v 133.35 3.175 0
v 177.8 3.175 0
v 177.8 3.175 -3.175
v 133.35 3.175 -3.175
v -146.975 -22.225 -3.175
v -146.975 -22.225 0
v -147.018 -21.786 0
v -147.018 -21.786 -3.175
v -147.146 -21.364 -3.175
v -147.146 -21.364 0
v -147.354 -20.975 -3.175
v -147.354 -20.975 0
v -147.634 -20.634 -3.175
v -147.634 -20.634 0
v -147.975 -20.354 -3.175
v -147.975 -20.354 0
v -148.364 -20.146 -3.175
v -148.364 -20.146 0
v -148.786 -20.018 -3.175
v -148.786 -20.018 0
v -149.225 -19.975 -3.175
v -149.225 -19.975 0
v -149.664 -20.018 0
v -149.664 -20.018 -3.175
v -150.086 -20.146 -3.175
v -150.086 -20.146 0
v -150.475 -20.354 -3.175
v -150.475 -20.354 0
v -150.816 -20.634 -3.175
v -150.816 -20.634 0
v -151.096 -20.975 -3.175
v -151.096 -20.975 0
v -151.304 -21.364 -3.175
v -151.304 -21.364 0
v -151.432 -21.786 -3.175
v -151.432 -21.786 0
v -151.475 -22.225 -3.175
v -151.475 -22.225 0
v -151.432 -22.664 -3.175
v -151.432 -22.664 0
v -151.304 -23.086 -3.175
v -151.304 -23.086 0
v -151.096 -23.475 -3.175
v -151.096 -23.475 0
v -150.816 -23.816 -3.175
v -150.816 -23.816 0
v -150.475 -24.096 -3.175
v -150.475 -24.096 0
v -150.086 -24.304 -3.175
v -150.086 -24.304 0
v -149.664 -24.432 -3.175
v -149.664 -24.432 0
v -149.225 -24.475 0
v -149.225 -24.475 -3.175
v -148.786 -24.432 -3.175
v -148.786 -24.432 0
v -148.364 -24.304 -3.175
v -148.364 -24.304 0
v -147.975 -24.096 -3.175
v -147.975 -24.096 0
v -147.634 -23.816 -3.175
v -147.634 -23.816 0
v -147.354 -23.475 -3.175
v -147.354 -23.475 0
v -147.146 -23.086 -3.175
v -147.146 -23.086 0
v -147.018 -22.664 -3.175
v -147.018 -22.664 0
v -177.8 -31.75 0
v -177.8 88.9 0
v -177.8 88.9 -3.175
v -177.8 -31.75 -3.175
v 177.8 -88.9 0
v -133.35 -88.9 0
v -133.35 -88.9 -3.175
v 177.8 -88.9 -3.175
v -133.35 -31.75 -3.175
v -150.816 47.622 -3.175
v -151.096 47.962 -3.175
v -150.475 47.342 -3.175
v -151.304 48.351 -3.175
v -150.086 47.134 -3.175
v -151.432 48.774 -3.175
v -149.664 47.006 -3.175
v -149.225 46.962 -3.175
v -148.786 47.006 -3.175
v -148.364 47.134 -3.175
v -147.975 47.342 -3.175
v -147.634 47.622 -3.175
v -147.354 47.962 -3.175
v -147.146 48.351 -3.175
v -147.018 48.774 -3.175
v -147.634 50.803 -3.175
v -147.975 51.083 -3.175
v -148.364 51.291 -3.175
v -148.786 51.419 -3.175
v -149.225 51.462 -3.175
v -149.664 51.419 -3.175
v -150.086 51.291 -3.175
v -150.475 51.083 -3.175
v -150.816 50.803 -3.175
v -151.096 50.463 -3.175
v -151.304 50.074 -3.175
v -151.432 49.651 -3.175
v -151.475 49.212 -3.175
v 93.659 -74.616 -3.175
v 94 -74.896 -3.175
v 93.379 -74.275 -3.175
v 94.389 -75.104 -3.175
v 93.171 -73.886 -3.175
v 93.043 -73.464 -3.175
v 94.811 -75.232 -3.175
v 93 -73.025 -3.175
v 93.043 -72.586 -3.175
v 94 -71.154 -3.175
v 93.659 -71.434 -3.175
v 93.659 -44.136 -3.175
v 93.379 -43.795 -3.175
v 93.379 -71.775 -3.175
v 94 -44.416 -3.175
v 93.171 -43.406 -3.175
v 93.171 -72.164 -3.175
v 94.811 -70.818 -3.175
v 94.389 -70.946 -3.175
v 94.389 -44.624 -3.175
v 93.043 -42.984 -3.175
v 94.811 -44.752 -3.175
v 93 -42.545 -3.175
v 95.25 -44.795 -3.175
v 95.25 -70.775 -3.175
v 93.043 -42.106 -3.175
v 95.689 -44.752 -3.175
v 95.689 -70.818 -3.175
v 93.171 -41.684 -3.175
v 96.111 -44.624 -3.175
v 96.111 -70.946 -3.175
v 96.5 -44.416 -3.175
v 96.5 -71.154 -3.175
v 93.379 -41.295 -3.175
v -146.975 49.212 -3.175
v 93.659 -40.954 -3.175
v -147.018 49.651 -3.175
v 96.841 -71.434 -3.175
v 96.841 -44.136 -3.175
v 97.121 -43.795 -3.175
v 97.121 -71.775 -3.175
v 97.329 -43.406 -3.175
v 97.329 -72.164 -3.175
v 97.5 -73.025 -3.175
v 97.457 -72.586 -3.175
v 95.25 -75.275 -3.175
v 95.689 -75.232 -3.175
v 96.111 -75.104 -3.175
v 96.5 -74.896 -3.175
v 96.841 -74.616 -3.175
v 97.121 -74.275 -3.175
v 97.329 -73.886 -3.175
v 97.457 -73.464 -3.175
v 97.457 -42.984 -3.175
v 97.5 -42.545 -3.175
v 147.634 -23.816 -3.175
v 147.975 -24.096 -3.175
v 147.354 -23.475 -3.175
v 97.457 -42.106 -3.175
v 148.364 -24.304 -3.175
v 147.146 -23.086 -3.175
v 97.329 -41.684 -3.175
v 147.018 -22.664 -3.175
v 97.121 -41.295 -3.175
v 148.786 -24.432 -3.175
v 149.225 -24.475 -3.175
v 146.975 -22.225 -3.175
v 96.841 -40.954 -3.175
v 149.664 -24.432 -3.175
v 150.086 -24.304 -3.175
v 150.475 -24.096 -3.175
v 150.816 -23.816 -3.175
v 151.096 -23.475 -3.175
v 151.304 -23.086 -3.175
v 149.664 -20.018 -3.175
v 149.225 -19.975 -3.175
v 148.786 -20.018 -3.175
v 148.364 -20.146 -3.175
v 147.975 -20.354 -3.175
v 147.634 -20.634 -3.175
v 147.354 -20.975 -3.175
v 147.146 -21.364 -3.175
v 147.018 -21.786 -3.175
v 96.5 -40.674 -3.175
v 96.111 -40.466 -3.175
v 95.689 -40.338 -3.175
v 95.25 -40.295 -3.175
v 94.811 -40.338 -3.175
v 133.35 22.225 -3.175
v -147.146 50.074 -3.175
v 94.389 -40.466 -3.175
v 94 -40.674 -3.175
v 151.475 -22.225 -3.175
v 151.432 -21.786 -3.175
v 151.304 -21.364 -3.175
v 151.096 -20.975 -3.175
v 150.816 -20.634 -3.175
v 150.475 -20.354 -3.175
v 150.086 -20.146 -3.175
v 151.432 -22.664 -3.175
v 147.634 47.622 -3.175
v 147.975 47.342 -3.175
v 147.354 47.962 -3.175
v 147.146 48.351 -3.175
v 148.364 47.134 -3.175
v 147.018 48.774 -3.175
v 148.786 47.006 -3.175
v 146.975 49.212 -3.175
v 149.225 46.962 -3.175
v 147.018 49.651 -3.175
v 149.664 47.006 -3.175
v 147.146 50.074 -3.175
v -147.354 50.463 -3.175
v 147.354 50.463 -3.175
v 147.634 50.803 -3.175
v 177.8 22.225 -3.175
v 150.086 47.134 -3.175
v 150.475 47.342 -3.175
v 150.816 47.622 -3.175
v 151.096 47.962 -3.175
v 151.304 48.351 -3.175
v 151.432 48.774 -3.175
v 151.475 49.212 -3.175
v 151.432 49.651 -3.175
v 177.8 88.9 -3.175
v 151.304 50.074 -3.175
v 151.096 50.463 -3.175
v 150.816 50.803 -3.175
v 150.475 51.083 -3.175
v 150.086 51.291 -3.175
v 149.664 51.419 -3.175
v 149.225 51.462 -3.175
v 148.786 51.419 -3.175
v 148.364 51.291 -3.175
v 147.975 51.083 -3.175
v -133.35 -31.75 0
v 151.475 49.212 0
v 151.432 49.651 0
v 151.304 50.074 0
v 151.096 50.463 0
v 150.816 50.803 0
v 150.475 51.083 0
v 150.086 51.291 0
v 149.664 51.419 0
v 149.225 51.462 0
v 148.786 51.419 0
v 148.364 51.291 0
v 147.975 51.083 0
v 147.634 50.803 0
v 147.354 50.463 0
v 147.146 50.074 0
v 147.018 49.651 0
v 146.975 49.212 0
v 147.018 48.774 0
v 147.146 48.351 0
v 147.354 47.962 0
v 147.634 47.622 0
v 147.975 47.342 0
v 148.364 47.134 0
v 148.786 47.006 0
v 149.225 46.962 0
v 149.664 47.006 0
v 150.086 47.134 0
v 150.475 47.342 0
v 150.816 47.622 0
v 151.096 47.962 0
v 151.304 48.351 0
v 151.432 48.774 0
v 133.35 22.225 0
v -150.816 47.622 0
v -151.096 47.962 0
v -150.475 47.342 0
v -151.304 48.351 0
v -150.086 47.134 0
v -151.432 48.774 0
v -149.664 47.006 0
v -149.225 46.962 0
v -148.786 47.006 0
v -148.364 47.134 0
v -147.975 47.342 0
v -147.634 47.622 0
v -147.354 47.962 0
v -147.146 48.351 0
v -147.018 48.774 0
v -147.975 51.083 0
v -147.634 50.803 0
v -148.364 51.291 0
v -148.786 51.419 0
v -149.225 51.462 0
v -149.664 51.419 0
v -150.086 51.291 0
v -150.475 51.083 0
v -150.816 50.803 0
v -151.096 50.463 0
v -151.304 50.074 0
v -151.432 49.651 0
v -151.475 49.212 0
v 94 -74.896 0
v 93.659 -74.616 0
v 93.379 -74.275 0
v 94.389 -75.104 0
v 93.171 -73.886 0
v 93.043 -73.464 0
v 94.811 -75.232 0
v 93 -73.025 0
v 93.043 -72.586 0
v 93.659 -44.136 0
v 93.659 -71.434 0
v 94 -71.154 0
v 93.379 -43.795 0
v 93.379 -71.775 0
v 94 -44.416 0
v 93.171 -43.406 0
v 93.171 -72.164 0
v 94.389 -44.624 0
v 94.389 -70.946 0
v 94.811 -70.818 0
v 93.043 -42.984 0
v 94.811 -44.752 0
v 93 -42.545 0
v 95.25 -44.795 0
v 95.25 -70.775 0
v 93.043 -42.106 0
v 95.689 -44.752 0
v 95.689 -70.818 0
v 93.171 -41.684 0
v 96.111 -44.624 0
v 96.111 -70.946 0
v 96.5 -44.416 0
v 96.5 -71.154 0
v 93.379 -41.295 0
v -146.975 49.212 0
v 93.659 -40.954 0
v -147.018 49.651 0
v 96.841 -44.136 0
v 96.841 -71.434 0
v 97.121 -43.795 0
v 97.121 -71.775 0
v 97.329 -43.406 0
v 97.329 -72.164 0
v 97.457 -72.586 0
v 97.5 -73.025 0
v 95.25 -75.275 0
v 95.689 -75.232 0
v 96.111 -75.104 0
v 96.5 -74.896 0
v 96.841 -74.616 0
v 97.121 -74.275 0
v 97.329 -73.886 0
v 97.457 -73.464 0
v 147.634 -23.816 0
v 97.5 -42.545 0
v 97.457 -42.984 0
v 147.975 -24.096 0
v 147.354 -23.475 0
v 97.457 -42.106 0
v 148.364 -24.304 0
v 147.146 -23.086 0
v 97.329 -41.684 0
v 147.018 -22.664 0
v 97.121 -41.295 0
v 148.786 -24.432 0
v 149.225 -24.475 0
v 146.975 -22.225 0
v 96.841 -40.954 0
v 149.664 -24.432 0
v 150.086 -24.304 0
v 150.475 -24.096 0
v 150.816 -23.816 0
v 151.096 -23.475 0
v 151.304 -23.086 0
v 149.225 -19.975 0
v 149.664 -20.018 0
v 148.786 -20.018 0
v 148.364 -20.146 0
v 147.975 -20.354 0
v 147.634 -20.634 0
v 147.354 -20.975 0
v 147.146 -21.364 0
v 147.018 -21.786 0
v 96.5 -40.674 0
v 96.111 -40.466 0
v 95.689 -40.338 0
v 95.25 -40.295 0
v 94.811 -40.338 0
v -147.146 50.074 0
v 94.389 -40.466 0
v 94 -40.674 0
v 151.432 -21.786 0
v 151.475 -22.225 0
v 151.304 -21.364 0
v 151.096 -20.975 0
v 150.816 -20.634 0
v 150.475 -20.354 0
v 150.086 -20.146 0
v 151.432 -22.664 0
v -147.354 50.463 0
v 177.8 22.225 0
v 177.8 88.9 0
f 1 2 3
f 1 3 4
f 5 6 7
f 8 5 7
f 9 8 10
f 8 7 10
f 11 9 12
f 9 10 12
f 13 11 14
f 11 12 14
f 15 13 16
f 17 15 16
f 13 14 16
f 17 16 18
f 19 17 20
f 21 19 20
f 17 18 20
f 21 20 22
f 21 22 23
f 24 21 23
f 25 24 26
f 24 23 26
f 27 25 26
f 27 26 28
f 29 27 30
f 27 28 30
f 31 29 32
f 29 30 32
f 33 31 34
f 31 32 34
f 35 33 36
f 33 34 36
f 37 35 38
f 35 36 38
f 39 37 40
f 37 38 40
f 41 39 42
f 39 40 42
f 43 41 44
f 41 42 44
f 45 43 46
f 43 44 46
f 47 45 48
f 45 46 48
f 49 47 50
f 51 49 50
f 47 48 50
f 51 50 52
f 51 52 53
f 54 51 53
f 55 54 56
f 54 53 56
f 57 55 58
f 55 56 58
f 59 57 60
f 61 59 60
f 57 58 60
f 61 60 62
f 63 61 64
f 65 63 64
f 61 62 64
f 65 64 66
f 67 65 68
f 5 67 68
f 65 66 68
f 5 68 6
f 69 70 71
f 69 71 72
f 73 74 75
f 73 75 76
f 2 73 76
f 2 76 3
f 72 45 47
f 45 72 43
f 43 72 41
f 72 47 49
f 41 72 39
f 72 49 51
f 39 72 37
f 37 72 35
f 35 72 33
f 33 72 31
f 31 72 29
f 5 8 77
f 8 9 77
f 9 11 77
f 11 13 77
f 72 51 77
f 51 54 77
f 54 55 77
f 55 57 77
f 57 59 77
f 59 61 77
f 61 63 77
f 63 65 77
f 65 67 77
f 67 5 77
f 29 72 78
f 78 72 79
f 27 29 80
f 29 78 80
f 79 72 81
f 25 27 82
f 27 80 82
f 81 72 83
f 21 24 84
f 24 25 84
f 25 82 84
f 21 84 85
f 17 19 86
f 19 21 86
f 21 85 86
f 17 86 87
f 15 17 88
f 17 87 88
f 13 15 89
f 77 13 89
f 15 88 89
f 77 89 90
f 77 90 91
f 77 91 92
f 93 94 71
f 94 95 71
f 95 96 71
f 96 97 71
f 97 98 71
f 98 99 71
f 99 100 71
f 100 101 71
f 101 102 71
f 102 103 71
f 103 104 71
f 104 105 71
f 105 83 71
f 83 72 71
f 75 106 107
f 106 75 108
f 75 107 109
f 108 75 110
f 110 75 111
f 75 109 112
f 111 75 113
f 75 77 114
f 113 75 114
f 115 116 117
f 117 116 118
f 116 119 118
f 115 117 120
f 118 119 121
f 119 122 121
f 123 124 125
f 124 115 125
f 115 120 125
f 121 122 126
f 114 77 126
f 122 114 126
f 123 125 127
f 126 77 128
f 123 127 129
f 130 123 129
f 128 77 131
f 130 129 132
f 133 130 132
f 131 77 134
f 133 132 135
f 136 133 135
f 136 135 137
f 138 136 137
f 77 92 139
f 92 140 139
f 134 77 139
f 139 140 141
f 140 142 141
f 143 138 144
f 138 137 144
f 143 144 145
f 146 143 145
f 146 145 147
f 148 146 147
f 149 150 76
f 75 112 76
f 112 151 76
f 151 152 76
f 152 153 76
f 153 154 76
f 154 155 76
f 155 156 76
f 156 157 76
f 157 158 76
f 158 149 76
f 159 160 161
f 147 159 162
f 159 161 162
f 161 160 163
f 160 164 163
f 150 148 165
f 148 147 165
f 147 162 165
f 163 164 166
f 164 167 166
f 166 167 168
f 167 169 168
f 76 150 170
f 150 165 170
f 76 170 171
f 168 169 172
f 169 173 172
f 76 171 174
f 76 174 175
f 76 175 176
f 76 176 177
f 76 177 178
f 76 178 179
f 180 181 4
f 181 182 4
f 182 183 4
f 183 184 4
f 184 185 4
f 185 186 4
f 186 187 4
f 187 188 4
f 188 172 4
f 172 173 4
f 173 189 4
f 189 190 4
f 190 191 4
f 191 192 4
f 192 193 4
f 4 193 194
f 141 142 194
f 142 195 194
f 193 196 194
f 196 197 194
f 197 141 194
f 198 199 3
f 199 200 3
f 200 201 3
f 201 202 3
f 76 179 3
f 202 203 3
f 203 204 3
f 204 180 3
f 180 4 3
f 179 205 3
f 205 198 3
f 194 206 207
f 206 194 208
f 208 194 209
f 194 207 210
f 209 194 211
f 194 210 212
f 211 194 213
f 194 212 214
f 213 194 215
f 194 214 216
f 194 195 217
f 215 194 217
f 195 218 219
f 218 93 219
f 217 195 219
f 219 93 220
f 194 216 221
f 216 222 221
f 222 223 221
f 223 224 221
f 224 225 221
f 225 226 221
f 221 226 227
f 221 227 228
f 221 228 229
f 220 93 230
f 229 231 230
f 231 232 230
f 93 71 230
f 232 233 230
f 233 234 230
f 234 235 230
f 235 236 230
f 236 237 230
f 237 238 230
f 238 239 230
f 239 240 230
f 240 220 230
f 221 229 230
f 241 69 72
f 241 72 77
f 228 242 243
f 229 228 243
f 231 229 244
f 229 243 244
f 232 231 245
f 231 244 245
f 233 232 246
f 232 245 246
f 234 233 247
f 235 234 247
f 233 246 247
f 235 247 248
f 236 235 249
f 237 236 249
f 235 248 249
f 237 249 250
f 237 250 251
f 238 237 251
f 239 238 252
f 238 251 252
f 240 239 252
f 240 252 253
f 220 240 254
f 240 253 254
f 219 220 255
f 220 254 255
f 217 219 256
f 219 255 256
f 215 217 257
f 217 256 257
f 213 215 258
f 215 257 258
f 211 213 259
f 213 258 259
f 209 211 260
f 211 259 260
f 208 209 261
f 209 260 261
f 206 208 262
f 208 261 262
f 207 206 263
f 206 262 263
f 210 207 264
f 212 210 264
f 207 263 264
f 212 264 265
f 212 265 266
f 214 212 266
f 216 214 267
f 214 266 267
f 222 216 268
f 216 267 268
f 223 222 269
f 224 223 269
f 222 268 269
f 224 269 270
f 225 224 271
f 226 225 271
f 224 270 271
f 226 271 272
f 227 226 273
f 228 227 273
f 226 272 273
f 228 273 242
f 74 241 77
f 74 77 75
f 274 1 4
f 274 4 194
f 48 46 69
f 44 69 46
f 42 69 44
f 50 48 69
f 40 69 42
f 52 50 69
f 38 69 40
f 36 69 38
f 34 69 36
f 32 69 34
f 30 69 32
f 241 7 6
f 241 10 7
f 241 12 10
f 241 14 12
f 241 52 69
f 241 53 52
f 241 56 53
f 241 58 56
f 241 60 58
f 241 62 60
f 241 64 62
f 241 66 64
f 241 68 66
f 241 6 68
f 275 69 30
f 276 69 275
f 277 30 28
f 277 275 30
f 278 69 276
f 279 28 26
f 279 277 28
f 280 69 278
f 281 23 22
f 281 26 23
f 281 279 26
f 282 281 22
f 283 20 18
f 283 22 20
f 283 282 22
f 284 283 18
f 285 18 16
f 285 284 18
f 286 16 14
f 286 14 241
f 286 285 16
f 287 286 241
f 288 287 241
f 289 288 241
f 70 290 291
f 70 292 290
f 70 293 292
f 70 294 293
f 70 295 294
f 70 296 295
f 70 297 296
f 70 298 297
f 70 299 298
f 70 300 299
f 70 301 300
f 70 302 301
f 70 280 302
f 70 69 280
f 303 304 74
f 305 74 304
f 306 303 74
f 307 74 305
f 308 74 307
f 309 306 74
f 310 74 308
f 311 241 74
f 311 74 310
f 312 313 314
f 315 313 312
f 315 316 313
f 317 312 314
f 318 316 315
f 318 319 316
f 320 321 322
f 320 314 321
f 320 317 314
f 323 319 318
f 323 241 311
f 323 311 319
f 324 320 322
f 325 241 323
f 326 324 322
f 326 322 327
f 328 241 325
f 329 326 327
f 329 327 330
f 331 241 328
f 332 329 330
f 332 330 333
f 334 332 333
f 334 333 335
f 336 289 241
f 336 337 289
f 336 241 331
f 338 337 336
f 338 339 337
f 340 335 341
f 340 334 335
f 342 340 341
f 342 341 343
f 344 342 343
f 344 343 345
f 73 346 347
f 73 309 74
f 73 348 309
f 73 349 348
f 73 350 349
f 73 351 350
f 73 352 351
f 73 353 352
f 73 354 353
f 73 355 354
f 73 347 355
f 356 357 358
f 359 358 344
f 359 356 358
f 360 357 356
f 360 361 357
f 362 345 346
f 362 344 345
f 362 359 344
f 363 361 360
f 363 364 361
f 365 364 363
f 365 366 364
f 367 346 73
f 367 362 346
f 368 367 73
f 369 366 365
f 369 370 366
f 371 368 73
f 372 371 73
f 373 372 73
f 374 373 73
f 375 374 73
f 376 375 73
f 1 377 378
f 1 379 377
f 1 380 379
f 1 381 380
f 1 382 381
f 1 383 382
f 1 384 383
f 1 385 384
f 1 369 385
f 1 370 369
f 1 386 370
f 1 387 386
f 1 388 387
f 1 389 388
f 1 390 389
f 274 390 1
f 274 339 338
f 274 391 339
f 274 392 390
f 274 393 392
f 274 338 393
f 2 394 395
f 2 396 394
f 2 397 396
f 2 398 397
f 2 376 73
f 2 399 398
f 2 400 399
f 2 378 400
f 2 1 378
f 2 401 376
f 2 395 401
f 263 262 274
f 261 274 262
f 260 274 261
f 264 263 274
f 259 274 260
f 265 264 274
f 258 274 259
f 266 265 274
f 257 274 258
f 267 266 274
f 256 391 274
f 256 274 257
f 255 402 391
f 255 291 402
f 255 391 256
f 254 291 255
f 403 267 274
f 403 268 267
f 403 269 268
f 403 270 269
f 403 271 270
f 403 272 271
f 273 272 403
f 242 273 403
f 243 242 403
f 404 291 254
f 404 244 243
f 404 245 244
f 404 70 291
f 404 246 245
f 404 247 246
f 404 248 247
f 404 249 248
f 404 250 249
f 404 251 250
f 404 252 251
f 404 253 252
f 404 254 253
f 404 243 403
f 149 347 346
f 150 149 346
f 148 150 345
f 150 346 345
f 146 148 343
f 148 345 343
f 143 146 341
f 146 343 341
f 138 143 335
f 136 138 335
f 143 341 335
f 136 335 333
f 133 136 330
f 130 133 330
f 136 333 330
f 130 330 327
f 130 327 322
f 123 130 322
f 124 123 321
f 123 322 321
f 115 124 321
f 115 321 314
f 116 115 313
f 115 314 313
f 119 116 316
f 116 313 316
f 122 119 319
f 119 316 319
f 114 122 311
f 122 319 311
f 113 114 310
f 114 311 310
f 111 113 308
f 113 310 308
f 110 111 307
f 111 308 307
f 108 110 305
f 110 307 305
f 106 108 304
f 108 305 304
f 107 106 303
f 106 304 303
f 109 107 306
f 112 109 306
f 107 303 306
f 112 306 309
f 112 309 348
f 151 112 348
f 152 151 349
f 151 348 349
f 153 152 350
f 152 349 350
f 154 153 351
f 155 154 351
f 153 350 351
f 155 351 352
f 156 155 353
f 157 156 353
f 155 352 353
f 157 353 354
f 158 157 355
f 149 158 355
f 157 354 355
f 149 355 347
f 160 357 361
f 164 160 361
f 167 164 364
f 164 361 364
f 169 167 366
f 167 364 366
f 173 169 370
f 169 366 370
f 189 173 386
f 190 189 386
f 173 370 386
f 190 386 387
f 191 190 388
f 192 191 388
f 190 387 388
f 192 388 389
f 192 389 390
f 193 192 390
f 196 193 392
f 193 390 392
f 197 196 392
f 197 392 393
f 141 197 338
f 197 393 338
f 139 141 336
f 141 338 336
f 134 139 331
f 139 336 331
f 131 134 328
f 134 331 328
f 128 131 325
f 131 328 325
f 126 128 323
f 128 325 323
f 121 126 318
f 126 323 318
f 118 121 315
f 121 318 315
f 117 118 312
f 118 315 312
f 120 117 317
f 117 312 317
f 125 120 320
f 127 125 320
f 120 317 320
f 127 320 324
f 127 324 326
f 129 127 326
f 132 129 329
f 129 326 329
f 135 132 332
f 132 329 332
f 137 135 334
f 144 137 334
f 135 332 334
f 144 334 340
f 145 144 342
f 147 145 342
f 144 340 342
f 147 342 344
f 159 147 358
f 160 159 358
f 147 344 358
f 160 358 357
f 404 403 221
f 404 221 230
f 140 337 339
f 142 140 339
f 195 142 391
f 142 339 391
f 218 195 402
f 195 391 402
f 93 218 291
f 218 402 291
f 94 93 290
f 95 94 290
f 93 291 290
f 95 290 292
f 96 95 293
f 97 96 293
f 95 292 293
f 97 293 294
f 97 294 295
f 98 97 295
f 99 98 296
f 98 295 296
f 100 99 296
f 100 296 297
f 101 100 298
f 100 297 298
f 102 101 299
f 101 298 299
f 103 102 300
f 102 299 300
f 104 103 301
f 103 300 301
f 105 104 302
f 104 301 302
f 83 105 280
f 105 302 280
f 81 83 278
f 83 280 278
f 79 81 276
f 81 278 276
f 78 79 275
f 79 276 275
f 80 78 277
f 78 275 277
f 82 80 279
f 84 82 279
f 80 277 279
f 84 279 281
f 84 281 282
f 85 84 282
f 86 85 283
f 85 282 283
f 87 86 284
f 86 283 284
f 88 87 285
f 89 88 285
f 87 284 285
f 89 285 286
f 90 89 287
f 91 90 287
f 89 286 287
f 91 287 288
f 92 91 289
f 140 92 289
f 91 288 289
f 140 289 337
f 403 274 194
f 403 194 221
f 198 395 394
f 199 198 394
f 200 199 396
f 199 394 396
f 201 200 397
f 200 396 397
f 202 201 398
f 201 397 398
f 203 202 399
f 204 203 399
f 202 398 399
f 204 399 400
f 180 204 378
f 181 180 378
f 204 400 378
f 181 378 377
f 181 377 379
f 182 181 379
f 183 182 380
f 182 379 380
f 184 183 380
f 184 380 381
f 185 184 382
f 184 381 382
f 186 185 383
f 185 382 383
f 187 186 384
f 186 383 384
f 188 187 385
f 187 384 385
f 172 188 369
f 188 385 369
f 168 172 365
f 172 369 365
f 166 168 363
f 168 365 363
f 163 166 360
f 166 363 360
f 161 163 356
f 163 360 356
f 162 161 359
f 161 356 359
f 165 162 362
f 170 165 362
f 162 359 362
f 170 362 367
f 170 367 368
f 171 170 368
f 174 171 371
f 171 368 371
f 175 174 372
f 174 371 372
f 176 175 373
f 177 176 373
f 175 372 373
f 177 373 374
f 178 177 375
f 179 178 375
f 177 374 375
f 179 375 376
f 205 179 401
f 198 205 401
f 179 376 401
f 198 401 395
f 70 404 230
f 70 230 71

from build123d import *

# Parameters (mm, degrees)
SKETCH1_R           = 2.25
BOSS_EXTRUDE1_DEPTH = 3.175


with BuildPart() as part:
    # Sketch1 → Boss-Extrude1 (new body)
    with BuildSketch(Plane.XY):
        Polygon((-133.35, -88.9), (177.8, -88.9), (177.8, 3.175), (133.35, 3.175), (133.35, 22.225), (177.8, 22.225), (177.8, 88.9), (-177.8, 88.9), (-177.8, -31.75), (-133.35, -31.75), align=None)
        with Locations((-149.225, -22.225)):
            Circle(SKETCH1_R, mode=Mode.SUBTRACT)
        with Locations((95.25, -73.025)):
            Circle(SKETCH1_R, mode=Mode.SUBTRACT)
        with Locations((95.25, -42.545)):
            Circle(SKETCH1_R, mode=Mode.SUBTRACT)
        with Locations((149.225, -22.225)):
            Circle(SKETCH1_R, mode=Mode.SUBTRACT)
        with Locations((-149.225, 49.2125)):
            Circle(SKETCH1_R, mode=Mode.SUBTRACT)
        with Locations((149.225, 49.2125)):
            Circle(SKETCH1_R, mode=Mode.SUBTRACT)
    extrude(amount=-BOSS_EXTRUDE1_DEPTH)


solid = part.part
